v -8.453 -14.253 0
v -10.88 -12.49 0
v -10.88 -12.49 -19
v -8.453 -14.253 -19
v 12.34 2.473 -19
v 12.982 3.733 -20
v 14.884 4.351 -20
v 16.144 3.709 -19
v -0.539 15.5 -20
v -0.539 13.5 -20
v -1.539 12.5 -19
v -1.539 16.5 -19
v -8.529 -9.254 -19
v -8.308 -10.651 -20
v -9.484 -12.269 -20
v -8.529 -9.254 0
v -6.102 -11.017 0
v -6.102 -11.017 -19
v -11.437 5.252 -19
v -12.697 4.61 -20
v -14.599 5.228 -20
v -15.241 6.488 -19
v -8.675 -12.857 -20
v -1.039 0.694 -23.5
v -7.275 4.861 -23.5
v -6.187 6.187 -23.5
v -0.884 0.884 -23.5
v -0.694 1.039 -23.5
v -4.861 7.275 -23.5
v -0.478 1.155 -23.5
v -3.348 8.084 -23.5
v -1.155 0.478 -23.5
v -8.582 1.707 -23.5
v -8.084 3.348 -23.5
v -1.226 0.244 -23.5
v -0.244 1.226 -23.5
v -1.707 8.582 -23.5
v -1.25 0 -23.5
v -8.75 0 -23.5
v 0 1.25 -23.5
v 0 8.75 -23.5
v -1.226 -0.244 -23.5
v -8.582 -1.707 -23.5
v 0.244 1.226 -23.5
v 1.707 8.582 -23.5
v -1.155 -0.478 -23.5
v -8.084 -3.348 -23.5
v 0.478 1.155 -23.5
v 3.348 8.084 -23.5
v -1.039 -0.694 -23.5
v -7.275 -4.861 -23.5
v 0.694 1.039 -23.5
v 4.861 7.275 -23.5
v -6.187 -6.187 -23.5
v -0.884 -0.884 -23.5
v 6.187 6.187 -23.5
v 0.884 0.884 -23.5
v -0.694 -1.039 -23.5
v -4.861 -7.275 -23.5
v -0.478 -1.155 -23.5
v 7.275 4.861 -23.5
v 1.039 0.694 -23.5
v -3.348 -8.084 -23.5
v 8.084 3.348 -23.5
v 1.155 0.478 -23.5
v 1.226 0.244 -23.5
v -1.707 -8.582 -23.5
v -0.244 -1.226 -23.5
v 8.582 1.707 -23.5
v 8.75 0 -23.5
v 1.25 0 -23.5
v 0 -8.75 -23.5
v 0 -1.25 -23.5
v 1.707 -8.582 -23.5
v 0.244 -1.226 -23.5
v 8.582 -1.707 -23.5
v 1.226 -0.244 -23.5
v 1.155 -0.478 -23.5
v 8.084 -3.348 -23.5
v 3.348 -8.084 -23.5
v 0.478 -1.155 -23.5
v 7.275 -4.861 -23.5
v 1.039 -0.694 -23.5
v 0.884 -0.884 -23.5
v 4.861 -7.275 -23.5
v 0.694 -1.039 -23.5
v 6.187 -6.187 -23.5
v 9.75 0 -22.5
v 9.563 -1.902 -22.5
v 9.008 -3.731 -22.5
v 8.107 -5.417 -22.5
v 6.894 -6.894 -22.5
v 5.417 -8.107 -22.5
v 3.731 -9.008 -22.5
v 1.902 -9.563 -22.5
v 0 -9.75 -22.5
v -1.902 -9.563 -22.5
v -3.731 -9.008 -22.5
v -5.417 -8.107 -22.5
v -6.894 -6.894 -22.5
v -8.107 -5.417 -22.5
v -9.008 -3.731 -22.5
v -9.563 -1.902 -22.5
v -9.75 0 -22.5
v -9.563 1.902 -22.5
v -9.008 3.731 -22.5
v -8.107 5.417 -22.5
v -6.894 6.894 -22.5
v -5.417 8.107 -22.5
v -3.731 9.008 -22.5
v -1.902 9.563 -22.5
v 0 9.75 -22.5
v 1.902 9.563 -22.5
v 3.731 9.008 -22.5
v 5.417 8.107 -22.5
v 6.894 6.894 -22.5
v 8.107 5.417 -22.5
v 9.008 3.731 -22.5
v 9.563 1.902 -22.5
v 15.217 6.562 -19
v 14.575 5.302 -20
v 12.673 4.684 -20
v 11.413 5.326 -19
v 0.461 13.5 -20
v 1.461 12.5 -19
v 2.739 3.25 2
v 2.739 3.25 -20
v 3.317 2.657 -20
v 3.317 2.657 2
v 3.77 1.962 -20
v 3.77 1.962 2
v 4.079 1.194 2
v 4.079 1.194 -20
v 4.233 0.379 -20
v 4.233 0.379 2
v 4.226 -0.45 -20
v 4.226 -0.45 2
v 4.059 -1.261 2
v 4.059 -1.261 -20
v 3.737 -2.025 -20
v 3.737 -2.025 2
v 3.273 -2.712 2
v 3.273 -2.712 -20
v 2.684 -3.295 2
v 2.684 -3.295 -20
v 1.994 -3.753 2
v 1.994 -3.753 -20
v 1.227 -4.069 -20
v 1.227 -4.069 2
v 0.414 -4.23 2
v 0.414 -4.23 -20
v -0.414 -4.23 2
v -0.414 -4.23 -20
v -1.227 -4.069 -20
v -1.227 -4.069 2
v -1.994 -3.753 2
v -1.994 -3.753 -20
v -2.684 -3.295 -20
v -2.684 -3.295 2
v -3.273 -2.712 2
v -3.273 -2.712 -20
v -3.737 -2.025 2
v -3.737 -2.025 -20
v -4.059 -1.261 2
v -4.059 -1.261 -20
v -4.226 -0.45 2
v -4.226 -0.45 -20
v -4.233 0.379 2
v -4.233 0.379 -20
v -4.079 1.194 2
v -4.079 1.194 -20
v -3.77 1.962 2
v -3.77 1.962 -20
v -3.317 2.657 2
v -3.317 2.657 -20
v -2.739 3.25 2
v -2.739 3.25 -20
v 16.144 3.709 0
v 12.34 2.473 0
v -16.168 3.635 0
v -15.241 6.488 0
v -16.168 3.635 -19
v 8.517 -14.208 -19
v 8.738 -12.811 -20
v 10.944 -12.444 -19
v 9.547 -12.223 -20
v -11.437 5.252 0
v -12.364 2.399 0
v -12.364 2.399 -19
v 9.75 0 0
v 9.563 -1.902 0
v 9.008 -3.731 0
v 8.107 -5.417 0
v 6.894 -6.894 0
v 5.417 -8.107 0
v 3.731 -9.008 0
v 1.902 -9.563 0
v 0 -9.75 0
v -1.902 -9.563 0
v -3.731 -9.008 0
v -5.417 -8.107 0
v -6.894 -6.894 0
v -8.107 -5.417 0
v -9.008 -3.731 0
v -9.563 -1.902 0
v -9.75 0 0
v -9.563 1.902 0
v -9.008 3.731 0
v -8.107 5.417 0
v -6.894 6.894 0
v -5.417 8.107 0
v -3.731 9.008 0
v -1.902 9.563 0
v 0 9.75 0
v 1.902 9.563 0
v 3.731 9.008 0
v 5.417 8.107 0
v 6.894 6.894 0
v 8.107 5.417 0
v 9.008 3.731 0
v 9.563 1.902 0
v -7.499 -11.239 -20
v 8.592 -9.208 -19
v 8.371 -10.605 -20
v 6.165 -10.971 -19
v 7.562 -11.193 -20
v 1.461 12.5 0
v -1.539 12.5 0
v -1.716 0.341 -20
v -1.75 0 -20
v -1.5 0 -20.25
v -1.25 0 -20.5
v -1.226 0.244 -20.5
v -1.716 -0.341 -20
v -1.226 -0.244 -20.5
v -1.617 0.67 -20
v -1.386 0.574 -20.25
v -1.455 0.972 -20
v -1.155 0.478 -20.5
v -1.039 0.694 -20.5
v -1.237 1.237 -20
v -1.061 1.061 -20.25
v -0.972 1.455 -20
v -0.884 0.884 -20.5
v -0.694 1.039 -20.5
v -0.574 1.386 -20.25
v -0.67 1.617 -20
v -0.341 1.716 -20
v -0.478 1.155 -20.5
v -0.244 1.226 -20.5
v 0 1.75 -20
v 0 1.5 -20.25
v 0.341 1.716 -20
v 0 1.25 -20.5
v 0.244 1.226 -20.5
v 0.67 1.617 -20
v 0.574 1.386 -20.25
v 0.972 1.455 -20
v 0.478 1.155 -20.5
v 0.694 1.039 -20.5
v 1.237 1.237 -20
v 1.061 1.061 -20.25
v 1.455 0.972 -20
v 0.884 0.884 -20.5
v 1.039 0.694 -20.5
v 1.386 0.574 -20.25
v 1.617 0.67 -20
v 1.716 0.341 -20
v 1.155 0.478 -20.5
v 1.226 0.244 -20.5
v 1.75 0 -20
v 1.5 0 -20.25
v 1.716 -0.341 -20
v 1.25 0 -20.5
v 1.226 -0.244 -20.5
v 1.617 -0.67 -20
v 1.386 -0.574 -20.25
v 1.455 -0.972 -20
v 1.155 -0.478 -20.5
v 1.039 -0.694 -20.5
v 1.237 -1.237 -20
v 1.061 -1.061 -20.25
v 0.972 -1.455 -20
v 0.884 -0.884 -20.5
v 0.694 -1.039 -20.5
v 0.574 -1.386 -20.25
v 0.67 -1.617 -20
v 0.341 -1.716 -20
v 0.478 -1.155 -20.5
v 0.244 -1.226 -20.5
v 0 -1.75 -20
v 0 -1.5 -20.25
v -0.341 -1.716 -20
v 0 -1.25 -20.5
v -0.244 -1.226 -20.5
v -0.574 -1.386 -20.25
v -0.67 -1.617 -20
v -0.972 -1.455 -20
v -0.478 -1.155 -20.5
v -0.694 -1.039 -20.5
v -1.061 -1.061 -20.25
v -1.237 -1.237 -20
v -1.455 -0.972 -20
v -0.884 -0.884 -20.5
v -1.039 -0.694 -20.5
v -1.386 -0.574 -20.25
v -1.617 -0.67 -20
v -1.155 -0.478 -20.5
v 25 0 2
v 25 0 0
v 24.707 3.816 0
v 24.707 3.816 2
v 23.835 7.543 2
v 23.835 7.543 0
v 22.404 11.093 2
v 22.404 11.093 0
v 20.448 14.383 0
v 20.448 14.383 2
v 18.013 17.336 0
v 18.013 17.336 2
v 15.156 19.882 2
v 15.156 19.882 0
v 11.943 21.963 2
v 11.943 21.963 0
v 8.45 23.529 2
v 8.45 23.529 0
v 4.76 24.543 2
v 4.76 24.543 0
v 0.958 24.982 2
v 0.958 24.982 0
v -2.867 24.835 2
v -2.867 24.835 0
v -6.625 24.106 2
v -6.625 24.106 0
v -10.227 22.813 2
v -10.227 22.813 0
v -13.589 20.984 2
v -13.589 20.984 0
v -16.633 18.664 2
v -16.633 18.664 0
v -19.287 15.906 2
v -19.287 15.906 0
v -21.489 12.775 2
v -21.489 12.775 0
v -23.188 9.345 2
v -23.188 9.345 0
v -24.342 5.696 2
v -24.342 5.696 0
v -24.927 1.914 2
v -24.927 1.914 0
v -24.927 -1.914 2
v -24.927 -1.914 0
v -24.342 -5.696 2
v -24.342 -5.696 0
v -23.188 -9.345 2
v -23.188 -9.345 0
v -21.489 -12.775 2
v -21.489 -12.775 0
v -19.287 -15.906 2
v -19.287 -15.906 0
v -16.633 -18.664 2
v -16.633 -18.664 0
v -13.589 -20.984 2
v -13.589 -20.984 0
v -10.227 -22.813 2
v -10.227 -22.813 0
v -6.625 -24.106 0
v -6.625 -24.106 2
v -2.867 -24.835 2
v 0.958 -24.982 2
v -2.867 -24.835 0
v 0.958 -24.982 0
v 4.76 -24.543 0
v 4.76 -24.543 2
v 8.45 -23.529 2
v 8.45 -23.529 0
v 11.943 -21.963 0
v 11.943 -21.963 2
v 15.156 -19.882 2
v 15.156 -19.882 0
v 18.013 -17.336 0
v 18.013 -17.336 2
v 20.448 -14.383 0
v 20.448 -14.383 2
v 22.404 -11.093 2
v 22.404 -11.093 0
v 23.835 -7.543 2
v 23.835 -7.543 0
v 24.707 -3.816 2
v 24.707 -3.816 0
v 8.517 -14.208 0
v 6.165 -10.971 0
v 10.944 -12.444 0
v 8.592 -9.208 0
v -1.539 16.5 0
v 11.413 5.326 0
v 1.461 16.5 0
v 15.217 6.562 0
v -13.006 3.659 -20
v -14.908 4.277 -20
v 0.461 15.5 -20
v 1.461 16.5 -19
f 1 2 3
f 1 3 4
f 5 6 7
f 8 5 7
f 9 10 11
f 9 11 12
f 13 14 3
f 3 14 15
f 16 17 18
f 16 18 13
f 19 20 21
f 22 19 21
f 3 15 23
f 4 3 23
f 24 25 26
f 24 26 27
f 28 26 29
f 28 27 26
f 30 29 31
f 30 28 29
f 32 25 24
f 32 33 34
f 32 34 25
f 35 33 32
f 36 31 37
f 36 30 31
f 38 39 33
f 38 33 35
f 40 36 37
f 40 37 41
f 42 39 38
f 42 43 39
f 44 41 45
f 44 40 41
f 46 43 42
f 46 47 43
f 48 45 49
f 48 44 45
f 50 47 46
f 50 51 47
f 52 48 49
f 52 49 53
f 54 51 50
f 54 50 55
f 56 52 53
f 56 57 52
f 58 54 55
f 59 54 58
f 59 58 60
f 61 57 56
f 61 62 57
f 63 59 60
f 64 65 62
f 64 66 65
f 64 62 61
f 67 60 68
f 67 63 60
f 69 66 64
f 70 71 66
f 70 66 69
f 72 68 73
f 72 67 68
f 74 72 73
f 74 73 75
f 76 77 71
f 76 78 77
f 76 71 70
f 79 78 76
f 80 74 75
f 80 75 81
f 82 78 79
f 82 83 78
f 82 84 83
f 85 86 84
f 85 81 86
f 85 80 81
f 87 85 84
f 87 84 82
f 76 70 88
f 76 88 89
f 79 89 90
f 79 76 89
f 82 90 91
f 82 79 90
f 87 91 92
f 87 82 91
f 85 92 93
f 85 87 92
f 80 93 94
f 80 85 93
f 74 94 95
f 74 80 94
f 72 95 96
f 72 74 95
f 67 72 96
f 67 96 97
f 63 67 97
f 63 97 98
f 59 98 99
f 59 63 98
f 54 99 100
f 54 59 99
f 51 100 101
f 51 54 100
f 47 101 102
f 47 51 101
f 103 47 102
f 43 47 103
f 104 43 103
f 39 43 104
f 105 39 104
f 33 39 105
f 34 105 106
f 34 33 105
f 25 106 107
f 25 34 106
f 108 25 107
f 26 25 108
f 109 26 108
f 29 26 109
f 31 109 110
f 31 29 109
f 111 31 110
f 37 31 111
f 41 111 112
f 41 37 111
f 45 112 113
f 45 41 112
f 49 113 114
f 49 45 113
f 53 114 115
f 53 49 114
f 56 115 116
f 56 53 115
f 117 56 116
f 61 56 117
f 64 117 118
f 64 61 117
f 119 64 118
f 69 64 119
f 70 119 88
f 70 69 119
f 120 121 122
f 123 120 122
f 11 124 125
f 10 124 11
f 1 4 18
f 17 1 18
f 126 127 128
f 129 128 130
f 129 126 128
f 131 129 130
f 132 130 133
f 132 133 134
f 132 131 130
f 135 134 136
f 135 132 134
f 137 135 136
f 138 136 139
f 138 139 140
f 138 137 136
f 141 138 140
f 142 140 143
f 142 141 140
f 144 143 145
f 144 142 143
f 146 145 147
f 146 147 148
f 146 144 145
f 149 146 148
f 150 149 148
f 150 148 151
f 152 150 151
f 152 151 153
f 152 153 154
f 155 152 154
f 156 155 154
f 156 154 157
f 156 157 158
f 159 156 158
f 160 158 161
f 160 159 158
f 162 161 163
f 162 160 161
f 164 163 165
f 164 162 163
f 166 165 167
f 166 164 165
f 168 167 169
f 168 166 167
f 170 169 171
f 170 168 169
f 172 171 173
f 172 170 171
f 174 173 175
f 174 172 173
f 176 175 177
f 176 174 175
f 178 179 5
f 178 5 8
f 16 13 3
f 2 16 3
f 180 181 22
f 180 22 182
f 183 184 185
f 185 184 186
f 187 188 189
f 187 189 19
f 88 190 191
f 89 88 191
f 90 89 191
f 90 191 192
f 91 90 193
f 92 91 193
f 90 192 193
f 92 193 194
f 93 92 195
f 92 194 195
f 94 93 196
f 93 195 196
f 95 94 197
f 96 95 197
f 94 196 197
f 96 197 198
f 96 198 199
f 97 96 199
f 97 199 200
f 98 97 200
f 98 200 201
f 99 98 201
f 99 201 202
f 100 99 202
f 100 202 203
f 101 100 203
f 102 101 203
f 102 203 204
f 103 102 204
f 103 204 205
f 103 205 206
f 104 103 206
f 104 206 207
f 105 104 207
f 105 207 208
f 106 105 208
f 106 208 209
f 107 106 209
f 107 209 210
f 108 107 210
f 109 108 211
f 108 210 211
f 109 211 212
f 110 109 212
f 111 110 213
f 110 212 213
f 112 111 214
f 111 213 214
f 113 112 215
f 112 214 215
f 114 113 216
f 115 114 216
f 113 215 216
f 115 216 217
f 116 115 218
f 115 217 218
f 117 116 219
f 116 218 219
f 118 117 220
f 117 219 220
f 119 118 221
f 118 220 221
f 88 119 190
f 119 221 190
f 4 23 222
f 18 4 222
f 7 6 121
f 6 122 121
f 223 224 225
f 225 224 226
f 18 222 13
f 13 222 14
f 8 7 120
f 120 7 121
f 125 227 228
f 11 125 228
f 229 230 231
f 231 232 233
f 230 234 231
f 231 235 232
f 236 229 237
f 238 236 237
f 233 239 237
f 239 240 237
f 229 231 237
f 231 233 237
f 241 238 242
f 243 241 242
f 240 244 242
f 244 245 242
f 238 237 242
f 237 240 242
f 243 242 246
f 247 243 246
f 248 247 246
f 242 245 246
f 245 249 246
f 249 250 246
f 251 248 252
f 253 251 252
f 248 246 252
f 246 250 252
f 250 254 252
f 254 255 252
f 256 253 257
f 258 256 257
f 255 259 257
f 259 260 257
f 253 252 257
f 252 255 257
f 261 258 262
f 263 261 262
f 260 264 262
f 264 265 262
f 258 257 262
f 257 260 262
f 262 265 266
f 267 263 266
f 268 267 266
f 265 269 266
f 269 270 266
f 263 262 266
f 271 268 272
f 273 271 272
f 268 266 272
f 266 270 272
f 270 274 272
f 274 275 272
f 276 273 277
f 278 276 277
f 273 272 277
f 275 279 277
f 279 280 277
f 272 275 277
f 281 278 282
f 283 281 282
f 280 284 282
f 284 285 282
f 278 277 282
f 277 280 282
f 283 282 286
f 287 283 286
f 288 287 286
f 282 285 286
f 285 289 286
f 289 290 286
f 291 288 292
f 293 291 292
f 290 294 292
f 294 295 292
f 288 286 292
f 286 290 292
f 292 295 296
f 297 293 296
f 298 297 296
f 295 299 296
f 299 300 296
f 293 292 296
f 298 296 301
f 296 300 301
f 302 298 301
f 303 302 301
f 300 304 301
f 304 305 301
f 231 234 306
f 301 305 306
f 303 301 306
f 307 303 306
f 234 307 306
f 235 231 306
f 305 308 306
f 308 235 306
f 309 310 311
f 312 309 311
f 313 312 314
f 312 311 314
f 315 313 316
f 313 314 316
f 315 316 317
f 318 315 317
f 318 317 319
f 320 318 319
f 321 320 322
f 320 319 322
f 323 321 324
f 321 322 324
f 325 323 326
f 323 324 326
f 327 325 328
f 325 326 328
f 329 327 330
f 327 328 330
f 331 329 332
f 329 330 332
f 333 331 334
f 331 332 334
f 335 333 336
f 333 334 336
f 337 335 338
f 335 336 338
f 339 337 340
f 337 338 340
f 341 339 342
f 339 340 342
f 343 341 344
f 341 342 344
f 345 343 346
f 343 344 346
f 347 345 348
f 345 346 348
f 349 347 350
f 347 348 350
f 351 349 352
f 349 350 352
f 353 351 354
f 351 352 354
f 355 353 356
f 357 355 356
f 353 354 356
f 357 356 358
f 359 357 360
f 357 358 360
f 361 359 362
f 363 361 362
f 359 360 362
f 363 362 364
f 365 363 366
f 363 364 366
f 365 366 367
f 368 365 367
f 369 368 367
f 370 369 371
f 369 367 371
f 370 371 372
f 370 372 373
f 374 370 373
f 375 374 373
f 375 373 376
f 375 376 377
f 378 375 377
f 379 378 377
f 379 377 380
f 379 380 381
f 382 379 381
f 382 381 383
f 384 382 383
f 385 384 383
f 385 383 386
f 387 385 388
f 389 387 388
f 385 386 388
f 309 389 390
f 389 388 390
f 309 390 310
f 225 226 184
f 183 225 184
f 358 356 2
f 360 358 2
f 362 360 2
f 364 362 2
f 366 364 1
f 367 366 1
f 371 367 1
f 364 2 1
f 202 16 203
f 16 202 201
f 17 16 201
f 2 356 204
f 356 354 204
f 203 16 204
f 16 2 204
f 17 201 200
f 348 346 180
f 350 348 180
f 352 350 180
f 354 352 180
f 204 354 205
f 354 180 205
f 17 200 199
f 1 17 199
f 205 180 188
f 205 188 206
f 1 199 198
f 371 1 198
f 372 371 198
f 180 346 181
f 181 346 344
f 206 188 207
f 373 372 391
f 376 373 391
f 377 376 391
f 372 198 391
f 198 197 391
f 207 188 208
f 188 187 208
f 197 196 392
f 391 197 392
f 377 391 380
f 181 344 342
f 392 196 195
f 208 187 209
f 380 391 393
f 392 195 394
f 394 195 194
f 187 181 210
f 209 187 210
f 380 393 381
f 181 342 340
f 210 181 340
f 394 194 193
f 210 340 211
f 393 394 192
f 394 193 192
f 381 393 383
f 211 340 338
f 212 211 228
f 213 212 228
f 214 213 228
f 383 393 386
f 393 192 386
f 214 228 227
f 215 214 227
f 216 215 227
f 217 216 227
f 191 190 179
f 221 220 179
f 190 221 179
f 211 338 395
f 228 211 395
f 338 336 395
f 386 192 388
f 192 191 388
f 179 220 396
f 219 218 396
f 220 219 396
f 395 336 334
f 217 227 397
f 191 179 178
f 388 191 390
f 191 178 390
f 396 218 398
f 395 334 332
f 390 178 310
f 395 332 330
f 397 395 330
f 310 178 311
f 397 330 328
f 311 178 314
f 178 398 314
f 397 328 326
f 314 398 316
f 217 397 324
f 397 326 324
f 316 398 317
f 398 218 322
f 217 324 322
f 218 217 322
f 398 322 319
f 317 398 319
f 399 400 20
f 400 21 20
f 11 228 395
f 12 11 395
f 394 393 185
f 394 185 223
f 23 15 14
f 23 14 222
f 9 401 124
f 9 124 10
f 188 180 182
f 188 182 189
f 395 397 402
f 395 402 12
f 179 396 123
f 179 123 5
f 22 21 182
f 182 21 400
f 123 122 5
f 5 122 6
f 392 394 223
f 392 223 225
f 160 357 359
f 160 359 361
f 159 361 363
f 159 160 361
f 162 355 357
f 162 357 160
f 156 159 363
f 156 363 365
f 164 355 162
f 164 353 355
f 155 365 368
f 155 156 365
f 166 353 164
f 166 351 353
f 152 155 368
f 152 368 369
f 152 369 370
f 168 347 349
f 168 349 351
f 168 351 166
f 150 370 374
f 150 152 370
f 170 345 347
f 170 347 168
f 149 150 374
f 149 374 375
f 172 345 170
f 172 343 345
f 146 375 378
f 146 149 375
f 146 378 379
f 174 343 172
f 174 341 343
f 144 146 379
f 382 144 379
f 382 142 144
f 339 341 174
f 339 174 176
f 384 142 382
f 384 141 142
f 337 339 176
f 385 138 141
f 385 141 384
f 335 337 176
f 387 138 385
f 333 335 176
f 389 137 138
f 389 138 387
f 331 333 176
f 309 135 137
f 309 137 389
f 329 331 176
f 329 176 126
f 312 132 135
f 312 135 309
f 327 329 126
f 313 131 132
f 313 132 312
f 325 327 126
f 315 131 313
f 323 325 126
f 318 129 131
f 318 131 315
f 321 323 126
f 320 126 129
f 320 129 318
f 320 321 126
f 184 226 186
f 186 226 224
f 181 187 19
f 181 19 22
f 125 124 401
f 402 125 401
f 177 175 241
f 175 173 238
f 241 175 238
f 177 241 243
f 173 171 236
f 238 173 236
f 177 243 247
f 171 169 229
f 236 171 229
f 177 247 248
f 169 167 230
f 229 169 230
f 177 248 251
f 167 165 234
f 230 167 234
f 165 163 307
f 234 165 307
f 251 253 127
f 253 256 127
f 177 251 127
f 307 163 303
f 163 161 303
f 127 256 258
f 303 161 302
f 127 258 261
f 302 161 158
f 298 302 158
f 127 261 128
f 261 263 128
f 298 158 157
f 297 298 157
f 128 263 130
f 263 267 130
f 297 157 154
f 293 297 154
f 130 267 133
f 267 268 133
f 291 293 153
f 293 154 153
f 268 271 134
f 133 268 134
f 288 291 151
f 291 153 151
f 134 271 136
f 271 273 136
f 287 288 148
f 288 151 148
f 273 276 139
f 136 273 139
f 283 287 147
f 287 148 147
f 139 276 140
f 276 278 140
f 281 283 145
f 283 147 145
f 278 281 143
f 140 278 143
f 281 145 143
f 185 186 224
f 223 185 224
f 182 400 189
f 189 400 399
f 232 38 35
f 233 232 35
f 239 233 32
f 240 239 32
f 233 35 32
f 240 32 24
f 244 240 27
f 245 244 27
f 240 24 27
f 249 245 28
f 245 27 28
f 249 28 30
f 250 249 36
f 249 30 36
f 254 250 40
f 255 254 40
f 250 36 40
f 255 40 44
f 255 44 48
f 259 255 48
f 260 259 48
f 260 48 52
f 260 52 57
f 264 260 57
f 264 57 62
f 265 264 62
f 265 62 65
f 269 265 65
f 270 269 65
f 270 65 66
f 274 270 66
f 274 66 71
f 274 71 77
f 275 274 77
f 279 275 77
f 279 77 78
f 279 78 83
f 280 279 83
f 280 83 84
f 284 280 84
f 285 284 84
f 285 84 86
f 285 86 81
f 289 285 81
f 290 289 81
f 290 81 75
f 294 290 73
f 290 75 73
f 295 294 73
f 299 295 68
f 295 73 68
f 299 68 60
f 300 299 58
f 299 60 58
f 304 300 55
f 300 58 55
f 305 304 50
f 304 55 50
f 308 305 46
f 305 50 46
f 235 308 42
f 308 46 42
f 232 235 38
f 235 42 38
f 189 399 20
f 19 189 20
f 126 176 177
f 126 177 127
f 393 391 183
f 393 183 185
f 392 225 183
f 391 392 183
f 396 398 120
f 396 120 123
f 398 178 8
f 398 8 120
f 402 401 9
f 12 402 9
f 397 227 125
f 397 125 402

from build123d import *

# Parameters (mm, degrees)
ESQUISSE3_R             = 25
BOSS_EXTRU_2_DEPTH      = 2
ESQUISSE5_R             = 9.75
ESQUISSE5_W             = 3
ESQUISSE5_H             = 4
BOSS_EXTRU_3_DEPTH      = 20
ENL_V_MAT_EXTRU_1_DEPTH = 22
ESQUISSE7_R             = 9.75
BOSS_EXTRU_4_DEPTH      = 3.5
ESQUISSE8_R             = 1.25
ENL_V_MAT_EXTRU_2_DEPTH = 44.591857038
CHANFREIN3_SIZE         = 1
CHANFREIN4_SIZE         = 1
CHANFREIN5_SIZE         = 0.5


with BuildPart() as part:
    # Esquisse3 → Boss.-Extru.2 (new body)
    with BuildSketch(Plane.XY):
        Circle(ESQUISSE3_R)
    extrude(amount=BOSS_EXTRU_2_DEPTH)

    # Esquisse5 → Boss.-Extru.3 (add)
    with BuildSketch(Plane(origin=(0, 0, 0), x_dir=(-1, 0, 0), z_dir=(0, 0, -1))):
        with Locations(Location((0, 0, 0), (0, 0, 180))):
            Circle(ESQUISSE5_R)
        Polygon((-15.216843748, 6.562492138), (-11.412617683, 5.326424161), (-12.339668666, 2.473254612), (-16.143894731, 3.709322589), align=None)
        with Locations((0.039037592, 14.5)):
            Rectangle(ESQUISSE5_W, ESQUISSE5_H)
        Polygon((15.240970307, 6.488238225), (16.16802129, 3.635068676), (12.363795225, 2.399000699), (11.436744242, 5.252170247), align=None)
        Polygon((10.880400079, -12.49004825), (8.453349096, -14.253404007), (6.102208086, -11.017336029), (8.52925907, -9.253980272), align=None)
        Polygon((-8.516513247, -14.207512565), (-10.94356423, -12.444156808), (-8.592423221, -9.20808883), (-6.165372238, -10.971444587), align=None)
    extrude(amount=BOSS_EXTRU_3_DEPTH)

    # Esquisse6 → Enlèv. mat.-Extru.1 (cut)
    with BuildSketch(Plane.XY.offset(2)):
        with BuildLine():
            Line((-2.738612788, 3.25), (2.738612788, 3.25))
            ThreePointArc((2.738612788, 3.25), (0, -4.25), (-2.738612788, 3.25))
        make_face()
    extrude(amount=-ENL_V_MAT_EXTRU_1_DEPTH, mode=Mode.SUBTRACT)

    # Esquisse7 → Boss.-Extru.4 (add)
    with BuildSketch(Plane(origin=(0, 0, -20), x_dir=(-1, 0, 0), z_dir=(0, 0, -1))):
        with Locations(Location((0, 0, 0), (0, 0, 180))):
            Circle(ESQUISSE7_R)
    extrude(amount=BOSS_EXTRU_4_DEPTH)

    # Esquisse8 → Enlèv. mat.-Extru.2 (cut, through all)
    with BuildSketch(Plane(origin=(0, 0, -23.5), x_dir=(-1, 0, 0), z_dir=(0, 0, -1))):
        Circle(ESQUISSE8_R)
    extrude(amount=-ENL_V_MAT_EXTRU_2_DEPTH, mode=Mode.SUBTRACT)

    # Chanfrein3
    chanfrein3_edges = [part.edges().sort_by_distance(p)[0] for p in [
        (14.241781698, 3.091288601, -20),
        (11.876143174, 3.899839386, -20),
        (13.314730715, 5.94445815, -20),
        (15.680369239, 5.135907364, -20),
    ]]
    chamfer(chanfrein3_edges, length=CHANFREIN3_SIZE)

    # Chanfrein4
    chanfrein4_edges = [part.edges().sort_by_distance(p)[0] for p in [
        (-1.539037592, 14.5, -20),
        (-0.039037592, 16.5, -20),
        (1.460962408, 14.5, -20),
        (-0.039037592, 12.5, -20),
        (-14.265908257, 3.017034687, -20),
        (-15.704495798, 5.061653451, -20),
        (-13.338857274, 5.870204236, -20),
        (-11.900269733, 3.825585473, -20),
        (-7.277778591, -12.635370018, -20),
        (-9.666874587, -13.371726128, -20),
        (-9.704829574, -10.872014261, -20),
        (-7.315733578, -10.135658151, -20),
        (9.767993725, -10.826122819, -20),
        (9.730038739, -13.325834686, -20),
        (7.340942742, -12.589478576, -20),
        (7.378897729, -10.089766709, -20),
        (-9.75, 0, -23.5),
    ]]
    chamfer(chanfrein4_edges, length=CHANFREIN4_SIZE)

    # Chanfrein5
    chanfrein5_edges = [part.edges().sort_by_distance(p)[0] for p in [
        (1.25, 0, -20),
    ]]
    chamfer(chanfrein5_edges, length=CHANFREIN5_SIZE)


solid = part.part
